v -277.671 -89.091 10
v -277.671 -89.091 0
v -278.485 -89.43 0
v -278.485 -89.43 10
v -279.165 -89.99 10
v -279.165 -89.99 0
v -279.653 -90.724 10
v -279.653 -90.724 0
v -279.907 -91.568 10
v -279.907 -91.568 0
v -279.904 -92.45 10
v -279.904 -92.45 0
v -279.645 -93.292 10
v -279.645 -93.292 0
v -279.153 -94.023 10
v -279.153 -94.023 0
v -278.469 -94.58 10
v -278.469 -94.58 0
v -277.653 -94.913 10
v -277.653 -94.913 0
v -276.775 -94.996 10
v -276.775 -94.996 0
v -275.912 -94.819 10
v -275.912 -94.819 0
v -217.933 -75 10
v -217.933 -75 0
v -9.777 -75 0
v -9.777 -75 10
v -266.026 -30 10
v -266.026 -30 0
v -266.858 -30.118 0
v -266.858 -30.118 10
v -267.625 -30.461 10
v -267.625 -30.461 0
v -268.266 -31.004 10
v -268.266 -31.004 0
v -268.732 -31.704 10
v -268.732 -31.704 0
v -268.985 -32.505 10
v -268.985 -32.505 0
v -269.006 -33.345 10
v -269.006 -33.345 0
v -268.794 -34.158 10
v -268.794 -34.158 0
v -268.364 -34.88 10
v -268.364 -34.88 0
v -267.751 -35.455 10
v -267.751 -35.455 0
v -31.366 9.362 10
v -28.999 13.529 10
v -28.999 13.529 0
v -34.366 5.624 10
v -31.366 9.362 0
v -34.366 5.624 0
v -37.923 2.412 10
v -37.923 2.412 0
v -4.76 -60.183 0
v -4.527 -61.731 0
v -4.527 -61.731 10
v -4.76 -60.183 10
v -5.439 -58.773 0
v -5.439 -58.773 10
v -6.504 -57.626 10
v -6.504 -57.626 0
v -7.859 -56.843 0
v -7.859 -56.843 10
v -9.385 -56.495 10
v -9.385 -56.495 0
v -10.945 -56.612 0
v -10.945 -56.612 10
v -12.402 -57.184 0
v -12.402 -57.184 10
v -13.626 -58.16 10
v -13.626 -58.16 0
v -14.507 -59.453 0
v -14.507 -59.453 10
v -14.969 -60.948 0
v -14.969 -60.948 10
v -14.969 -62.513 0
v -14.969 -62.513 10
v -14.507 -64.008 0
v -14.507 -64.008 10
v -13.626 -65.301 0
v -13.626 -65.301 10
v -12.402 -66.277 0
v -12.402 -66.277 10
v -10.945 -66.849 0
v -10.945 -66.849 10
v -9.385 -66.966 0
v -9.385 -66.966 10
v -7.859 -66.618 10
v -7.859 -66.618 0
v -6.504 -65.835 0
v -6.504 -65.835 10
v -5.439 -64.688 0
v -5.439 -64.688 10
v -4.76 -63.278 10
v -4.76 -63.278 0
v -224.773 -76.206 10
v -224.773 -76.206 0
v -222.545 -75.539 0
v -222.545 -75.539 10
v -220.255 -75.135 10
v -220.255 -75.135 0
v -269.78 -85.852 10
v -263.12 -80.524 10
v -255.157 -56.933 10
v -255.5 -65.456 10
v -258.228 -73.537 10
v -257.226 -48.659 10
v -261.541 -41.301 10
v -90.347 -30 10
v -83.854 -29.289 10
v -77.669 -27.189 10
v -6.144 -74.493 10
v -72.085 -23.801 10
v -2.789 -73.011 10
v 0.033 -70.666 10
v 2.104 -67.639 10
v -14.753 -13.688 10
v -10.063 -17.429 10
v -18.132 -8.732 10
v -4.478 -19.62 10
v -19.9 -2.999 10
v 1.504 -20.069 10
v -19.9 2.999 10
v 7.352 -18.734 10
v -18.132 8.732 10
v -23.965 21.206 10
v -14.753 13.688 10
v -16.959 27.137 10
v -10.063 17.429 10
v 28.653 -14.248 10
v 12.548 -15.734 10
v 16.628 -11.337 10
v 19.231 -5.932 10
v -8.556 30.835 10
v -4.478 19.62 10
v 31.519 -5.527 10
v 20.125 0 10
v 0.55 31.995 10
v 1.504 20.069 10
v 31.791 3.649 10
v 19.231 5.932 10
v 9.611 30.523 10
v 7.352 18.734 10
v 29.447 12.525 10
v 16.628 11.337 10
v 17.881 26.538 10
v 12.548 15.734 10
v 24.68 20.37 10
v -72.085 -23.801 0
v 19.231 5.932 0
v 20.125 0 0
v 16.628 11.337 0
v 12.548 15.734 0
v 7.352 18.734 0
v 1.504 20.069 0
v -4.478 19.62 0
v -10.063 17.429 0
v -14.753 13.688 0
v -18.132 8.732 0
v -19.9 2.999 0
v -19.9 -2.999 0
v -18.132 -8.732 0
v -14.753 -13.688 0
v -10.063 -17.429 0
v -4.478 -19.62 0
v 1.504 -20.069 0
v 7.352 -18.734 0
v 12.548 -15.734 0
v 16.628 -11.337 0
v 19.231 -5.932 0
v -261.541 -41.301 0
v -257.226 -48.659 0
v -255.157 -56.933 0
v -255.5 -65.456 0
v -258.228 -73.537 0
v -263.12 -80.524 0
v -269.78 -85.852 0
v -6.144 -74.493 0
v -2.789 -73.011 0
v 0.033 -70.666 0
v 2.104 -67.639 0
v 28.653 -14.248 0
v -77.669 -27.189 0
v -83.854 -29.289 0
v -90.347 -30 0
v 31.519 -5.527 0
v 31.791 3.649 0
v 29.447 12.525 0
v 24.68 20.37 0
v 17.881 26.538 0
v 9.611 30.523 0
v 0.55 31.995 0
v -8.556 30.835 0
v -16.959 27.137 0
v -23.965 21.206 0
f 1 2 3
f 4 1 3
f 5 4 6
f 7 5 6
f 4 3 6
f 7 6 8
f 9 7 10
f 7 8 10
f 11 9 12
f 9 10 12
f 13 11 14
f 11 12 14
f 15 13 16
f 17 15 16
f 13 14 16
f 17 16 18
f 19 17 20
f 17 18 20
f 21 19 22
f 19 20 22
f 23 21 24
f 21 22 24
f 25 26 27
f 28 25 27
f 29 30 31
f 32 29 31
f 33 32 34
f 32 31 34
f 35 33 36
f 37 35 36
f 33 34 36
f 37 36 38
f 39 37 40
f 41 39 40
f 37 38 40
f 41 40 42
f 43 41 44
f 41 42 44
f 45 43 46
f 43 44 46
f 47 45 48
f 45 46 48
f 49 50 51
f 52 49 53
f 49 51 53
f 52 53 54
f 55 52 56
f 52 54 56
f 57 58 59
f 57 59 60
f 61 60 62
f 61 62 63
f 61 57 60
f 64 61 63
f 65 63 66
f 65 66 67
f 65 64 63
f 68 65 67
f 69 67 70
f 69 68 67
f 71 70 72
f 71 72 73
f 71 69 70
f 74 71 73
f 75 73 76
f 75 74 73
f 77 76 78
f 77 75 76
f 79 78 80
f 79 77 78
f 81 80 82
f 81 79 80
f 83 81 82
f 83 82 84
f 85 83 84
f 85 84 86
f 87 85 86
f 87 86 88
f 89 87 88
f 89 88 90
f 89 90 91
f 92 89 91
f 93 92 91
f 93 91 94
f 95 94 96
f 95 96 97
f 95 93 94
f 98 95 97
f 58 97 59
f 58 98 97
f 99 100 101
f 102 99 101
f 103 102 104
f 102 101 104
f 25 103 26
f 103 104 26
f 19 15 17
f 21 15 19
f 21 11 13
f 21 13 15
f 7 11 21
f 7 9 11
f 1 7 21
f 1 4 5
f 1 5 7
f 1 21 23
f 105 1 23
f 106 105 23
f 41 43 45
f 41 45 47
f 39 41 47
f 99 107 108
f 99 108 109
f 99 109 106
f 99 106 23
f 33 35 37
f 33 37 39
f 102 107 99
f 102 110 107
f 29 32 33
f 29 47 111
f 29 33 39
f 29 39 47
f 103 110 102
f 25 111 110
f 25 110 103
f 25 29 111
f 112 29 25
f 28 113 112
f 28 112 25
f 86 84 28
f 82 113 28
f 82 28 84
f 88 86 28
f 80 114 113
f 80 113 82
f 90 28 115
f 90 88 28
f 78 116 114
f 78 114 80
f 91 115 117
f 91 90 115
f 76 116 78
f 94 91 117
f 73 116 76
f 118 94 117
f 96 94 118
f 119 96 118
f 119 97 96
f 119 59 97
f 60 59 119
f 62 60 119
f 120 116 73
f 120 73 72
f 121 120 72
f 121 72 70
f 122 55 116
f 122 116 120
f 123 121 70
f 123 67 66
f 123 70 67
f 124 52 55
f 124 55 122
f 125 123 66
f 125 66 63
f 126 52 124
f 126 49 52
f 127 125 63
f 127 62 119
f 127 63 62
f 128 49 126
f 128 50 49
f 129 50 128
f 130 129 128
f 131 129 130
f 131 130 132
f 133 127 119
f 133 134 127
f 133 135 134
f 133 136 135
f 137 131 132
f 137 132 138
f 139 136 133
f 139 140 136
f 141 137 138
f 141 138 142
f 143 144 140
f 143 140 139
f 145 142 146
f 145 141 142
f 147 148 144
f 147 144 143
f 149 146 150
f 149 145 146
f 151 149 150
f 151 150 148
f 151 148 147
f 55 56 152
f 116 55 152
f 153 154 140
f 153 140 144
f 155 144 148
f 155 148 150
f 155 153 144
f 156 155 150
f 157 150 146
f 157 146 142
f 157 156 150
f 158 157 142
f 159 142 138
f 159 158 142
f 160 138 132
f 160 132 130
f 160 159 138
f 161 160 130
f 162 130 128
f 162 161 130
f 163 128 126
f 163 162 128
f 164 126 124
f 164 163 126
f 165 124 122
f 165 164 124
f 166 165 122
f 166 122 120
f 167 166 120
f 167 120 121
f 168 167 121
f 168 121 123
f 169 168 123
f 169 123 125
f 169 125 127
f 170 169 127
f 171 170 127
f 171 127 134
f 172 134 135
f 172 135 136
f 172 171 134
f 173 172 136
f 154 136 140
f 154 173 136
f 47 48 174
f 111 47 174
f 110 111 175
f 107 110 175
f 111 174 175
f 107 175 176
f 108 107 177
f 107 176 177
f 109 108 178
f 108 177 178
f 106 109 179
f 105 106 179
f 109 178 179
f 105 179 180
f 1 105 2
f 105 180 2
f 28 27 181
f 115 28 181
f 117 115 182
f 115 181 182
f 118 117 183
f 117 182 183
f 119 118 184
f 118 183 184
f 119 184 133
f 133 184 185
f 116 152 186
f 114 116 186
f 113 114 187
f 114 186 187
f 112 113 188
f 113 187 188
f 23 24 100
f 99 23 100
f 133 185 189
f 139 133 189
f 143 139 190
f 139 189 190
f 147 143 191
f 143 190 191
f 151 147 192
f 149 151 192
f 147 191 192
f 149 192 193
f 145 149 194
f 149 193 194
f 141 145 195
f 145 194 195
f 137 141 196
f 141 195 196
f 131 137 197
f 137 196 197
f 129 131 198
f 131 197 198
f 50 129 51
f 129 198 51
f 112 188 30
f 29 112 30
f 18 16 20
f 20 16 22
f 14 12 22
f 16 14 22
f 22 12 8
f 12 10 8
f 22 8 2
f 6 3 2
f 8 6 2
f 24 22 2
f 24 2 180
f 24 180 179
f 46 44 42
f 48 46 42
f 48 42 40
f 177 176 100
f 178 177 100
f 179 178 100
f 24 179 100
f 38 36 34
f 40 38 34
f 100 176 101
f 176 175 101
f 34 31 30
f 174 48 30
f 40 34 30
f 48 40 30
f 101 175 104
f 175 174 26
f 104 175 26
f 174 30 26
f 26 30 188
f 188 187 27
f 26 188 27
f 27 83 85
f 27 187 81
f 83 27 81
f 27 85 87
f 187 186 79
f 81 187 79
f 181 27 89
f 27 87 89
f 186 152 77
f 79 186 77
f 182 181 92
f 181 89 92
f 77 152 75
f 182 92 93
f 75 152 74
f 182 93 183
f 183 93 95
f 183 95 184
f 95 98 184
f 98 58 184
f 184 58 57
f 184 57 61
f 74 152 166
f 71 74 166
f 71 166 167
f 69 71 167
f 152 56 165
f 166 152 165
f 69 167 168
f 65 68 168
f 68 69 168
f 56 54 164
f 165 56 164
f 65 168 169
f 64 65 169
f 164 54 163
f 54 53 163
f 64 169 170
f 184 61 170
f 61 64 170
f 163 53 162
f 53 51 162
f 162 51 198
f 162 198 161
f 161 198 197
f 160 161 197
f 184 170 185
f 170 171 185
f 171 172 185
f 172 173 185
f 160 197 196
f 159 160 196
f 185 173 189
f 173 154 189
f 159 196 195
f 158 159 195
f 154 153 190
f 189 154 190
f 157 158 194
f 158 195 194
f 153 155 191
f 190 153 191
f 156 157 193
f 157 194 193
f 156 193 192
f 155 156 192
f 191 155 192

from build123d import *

# Parameters (mm, degrees)
SKETCH1_R      = 20.125
SKETCH1_R_2    = 5.25
EXTRUDE1_DEPTH = 10


with BuildPart() as part:
    # Sketch1 → Extrude1 (new body)
    with BuildSketch(Plane.XY):
        with BuildLine():
            Line((-37.923361282, 2.412191764), (-72.084536873, -23.800600209))
            ThreePointArc((-72.084536873, -23.800600209), (-80.704195785, -28.407903885), (-90.347379744, -30))
            Line((-90.347379744, -30), (-266.026334039, -30))
            ThreePointArc((-266.026334039, -30), (-268.886721807, -32.095465966), (-267.751212763, -35.454545455))
            ThreePointArc((-267.751212763, -35.454545455), (-255.500241033, -65.45565953), (-277.670674774, -89.090909091))
            ThreePointArc((-277.670674774, -89.090909091), (-279.805574248, -92.880647284), (-275.911681822, -94.819077862))
            Line((-275.911681822, -94.819077862), (-224.773076173, -76.206147584))
            ThreePointArc((-224.773076173, -76.206147584), (-221.40563686, -75.30384494), (-217.932673306, -75))
            Line((-217.932673306, -75), (-9.777154065, -75))
            ThreePointArc((-9.777154065, -75), (-2.78855267, -73.010526422), (2.10446711, -67.638663429))
            Line((2.10446711, -67.638663429), (28.653113345, -14.247775111))
            ThreePointArc((28.653113345, -14.247775111), (13.889557824, 28.828461344), (-28.999331175, 13.529182954))
            ThreePointArc((-28.999331175, 13.529182954), (-32.791417533, 7.432910208), (-37.923361282, 2.412191764))
        make_face()
        Circle(SKETCH1_R, mode=Mode.SUBTRACT)
        with Locations((-9.777154065, -61.730521287)):
            Circle(SKETCH1_R_2, mode=Mode.SUBTRACT)
    extrude(amount=EXTRUDE1_DEPTH)


solid = part.part
